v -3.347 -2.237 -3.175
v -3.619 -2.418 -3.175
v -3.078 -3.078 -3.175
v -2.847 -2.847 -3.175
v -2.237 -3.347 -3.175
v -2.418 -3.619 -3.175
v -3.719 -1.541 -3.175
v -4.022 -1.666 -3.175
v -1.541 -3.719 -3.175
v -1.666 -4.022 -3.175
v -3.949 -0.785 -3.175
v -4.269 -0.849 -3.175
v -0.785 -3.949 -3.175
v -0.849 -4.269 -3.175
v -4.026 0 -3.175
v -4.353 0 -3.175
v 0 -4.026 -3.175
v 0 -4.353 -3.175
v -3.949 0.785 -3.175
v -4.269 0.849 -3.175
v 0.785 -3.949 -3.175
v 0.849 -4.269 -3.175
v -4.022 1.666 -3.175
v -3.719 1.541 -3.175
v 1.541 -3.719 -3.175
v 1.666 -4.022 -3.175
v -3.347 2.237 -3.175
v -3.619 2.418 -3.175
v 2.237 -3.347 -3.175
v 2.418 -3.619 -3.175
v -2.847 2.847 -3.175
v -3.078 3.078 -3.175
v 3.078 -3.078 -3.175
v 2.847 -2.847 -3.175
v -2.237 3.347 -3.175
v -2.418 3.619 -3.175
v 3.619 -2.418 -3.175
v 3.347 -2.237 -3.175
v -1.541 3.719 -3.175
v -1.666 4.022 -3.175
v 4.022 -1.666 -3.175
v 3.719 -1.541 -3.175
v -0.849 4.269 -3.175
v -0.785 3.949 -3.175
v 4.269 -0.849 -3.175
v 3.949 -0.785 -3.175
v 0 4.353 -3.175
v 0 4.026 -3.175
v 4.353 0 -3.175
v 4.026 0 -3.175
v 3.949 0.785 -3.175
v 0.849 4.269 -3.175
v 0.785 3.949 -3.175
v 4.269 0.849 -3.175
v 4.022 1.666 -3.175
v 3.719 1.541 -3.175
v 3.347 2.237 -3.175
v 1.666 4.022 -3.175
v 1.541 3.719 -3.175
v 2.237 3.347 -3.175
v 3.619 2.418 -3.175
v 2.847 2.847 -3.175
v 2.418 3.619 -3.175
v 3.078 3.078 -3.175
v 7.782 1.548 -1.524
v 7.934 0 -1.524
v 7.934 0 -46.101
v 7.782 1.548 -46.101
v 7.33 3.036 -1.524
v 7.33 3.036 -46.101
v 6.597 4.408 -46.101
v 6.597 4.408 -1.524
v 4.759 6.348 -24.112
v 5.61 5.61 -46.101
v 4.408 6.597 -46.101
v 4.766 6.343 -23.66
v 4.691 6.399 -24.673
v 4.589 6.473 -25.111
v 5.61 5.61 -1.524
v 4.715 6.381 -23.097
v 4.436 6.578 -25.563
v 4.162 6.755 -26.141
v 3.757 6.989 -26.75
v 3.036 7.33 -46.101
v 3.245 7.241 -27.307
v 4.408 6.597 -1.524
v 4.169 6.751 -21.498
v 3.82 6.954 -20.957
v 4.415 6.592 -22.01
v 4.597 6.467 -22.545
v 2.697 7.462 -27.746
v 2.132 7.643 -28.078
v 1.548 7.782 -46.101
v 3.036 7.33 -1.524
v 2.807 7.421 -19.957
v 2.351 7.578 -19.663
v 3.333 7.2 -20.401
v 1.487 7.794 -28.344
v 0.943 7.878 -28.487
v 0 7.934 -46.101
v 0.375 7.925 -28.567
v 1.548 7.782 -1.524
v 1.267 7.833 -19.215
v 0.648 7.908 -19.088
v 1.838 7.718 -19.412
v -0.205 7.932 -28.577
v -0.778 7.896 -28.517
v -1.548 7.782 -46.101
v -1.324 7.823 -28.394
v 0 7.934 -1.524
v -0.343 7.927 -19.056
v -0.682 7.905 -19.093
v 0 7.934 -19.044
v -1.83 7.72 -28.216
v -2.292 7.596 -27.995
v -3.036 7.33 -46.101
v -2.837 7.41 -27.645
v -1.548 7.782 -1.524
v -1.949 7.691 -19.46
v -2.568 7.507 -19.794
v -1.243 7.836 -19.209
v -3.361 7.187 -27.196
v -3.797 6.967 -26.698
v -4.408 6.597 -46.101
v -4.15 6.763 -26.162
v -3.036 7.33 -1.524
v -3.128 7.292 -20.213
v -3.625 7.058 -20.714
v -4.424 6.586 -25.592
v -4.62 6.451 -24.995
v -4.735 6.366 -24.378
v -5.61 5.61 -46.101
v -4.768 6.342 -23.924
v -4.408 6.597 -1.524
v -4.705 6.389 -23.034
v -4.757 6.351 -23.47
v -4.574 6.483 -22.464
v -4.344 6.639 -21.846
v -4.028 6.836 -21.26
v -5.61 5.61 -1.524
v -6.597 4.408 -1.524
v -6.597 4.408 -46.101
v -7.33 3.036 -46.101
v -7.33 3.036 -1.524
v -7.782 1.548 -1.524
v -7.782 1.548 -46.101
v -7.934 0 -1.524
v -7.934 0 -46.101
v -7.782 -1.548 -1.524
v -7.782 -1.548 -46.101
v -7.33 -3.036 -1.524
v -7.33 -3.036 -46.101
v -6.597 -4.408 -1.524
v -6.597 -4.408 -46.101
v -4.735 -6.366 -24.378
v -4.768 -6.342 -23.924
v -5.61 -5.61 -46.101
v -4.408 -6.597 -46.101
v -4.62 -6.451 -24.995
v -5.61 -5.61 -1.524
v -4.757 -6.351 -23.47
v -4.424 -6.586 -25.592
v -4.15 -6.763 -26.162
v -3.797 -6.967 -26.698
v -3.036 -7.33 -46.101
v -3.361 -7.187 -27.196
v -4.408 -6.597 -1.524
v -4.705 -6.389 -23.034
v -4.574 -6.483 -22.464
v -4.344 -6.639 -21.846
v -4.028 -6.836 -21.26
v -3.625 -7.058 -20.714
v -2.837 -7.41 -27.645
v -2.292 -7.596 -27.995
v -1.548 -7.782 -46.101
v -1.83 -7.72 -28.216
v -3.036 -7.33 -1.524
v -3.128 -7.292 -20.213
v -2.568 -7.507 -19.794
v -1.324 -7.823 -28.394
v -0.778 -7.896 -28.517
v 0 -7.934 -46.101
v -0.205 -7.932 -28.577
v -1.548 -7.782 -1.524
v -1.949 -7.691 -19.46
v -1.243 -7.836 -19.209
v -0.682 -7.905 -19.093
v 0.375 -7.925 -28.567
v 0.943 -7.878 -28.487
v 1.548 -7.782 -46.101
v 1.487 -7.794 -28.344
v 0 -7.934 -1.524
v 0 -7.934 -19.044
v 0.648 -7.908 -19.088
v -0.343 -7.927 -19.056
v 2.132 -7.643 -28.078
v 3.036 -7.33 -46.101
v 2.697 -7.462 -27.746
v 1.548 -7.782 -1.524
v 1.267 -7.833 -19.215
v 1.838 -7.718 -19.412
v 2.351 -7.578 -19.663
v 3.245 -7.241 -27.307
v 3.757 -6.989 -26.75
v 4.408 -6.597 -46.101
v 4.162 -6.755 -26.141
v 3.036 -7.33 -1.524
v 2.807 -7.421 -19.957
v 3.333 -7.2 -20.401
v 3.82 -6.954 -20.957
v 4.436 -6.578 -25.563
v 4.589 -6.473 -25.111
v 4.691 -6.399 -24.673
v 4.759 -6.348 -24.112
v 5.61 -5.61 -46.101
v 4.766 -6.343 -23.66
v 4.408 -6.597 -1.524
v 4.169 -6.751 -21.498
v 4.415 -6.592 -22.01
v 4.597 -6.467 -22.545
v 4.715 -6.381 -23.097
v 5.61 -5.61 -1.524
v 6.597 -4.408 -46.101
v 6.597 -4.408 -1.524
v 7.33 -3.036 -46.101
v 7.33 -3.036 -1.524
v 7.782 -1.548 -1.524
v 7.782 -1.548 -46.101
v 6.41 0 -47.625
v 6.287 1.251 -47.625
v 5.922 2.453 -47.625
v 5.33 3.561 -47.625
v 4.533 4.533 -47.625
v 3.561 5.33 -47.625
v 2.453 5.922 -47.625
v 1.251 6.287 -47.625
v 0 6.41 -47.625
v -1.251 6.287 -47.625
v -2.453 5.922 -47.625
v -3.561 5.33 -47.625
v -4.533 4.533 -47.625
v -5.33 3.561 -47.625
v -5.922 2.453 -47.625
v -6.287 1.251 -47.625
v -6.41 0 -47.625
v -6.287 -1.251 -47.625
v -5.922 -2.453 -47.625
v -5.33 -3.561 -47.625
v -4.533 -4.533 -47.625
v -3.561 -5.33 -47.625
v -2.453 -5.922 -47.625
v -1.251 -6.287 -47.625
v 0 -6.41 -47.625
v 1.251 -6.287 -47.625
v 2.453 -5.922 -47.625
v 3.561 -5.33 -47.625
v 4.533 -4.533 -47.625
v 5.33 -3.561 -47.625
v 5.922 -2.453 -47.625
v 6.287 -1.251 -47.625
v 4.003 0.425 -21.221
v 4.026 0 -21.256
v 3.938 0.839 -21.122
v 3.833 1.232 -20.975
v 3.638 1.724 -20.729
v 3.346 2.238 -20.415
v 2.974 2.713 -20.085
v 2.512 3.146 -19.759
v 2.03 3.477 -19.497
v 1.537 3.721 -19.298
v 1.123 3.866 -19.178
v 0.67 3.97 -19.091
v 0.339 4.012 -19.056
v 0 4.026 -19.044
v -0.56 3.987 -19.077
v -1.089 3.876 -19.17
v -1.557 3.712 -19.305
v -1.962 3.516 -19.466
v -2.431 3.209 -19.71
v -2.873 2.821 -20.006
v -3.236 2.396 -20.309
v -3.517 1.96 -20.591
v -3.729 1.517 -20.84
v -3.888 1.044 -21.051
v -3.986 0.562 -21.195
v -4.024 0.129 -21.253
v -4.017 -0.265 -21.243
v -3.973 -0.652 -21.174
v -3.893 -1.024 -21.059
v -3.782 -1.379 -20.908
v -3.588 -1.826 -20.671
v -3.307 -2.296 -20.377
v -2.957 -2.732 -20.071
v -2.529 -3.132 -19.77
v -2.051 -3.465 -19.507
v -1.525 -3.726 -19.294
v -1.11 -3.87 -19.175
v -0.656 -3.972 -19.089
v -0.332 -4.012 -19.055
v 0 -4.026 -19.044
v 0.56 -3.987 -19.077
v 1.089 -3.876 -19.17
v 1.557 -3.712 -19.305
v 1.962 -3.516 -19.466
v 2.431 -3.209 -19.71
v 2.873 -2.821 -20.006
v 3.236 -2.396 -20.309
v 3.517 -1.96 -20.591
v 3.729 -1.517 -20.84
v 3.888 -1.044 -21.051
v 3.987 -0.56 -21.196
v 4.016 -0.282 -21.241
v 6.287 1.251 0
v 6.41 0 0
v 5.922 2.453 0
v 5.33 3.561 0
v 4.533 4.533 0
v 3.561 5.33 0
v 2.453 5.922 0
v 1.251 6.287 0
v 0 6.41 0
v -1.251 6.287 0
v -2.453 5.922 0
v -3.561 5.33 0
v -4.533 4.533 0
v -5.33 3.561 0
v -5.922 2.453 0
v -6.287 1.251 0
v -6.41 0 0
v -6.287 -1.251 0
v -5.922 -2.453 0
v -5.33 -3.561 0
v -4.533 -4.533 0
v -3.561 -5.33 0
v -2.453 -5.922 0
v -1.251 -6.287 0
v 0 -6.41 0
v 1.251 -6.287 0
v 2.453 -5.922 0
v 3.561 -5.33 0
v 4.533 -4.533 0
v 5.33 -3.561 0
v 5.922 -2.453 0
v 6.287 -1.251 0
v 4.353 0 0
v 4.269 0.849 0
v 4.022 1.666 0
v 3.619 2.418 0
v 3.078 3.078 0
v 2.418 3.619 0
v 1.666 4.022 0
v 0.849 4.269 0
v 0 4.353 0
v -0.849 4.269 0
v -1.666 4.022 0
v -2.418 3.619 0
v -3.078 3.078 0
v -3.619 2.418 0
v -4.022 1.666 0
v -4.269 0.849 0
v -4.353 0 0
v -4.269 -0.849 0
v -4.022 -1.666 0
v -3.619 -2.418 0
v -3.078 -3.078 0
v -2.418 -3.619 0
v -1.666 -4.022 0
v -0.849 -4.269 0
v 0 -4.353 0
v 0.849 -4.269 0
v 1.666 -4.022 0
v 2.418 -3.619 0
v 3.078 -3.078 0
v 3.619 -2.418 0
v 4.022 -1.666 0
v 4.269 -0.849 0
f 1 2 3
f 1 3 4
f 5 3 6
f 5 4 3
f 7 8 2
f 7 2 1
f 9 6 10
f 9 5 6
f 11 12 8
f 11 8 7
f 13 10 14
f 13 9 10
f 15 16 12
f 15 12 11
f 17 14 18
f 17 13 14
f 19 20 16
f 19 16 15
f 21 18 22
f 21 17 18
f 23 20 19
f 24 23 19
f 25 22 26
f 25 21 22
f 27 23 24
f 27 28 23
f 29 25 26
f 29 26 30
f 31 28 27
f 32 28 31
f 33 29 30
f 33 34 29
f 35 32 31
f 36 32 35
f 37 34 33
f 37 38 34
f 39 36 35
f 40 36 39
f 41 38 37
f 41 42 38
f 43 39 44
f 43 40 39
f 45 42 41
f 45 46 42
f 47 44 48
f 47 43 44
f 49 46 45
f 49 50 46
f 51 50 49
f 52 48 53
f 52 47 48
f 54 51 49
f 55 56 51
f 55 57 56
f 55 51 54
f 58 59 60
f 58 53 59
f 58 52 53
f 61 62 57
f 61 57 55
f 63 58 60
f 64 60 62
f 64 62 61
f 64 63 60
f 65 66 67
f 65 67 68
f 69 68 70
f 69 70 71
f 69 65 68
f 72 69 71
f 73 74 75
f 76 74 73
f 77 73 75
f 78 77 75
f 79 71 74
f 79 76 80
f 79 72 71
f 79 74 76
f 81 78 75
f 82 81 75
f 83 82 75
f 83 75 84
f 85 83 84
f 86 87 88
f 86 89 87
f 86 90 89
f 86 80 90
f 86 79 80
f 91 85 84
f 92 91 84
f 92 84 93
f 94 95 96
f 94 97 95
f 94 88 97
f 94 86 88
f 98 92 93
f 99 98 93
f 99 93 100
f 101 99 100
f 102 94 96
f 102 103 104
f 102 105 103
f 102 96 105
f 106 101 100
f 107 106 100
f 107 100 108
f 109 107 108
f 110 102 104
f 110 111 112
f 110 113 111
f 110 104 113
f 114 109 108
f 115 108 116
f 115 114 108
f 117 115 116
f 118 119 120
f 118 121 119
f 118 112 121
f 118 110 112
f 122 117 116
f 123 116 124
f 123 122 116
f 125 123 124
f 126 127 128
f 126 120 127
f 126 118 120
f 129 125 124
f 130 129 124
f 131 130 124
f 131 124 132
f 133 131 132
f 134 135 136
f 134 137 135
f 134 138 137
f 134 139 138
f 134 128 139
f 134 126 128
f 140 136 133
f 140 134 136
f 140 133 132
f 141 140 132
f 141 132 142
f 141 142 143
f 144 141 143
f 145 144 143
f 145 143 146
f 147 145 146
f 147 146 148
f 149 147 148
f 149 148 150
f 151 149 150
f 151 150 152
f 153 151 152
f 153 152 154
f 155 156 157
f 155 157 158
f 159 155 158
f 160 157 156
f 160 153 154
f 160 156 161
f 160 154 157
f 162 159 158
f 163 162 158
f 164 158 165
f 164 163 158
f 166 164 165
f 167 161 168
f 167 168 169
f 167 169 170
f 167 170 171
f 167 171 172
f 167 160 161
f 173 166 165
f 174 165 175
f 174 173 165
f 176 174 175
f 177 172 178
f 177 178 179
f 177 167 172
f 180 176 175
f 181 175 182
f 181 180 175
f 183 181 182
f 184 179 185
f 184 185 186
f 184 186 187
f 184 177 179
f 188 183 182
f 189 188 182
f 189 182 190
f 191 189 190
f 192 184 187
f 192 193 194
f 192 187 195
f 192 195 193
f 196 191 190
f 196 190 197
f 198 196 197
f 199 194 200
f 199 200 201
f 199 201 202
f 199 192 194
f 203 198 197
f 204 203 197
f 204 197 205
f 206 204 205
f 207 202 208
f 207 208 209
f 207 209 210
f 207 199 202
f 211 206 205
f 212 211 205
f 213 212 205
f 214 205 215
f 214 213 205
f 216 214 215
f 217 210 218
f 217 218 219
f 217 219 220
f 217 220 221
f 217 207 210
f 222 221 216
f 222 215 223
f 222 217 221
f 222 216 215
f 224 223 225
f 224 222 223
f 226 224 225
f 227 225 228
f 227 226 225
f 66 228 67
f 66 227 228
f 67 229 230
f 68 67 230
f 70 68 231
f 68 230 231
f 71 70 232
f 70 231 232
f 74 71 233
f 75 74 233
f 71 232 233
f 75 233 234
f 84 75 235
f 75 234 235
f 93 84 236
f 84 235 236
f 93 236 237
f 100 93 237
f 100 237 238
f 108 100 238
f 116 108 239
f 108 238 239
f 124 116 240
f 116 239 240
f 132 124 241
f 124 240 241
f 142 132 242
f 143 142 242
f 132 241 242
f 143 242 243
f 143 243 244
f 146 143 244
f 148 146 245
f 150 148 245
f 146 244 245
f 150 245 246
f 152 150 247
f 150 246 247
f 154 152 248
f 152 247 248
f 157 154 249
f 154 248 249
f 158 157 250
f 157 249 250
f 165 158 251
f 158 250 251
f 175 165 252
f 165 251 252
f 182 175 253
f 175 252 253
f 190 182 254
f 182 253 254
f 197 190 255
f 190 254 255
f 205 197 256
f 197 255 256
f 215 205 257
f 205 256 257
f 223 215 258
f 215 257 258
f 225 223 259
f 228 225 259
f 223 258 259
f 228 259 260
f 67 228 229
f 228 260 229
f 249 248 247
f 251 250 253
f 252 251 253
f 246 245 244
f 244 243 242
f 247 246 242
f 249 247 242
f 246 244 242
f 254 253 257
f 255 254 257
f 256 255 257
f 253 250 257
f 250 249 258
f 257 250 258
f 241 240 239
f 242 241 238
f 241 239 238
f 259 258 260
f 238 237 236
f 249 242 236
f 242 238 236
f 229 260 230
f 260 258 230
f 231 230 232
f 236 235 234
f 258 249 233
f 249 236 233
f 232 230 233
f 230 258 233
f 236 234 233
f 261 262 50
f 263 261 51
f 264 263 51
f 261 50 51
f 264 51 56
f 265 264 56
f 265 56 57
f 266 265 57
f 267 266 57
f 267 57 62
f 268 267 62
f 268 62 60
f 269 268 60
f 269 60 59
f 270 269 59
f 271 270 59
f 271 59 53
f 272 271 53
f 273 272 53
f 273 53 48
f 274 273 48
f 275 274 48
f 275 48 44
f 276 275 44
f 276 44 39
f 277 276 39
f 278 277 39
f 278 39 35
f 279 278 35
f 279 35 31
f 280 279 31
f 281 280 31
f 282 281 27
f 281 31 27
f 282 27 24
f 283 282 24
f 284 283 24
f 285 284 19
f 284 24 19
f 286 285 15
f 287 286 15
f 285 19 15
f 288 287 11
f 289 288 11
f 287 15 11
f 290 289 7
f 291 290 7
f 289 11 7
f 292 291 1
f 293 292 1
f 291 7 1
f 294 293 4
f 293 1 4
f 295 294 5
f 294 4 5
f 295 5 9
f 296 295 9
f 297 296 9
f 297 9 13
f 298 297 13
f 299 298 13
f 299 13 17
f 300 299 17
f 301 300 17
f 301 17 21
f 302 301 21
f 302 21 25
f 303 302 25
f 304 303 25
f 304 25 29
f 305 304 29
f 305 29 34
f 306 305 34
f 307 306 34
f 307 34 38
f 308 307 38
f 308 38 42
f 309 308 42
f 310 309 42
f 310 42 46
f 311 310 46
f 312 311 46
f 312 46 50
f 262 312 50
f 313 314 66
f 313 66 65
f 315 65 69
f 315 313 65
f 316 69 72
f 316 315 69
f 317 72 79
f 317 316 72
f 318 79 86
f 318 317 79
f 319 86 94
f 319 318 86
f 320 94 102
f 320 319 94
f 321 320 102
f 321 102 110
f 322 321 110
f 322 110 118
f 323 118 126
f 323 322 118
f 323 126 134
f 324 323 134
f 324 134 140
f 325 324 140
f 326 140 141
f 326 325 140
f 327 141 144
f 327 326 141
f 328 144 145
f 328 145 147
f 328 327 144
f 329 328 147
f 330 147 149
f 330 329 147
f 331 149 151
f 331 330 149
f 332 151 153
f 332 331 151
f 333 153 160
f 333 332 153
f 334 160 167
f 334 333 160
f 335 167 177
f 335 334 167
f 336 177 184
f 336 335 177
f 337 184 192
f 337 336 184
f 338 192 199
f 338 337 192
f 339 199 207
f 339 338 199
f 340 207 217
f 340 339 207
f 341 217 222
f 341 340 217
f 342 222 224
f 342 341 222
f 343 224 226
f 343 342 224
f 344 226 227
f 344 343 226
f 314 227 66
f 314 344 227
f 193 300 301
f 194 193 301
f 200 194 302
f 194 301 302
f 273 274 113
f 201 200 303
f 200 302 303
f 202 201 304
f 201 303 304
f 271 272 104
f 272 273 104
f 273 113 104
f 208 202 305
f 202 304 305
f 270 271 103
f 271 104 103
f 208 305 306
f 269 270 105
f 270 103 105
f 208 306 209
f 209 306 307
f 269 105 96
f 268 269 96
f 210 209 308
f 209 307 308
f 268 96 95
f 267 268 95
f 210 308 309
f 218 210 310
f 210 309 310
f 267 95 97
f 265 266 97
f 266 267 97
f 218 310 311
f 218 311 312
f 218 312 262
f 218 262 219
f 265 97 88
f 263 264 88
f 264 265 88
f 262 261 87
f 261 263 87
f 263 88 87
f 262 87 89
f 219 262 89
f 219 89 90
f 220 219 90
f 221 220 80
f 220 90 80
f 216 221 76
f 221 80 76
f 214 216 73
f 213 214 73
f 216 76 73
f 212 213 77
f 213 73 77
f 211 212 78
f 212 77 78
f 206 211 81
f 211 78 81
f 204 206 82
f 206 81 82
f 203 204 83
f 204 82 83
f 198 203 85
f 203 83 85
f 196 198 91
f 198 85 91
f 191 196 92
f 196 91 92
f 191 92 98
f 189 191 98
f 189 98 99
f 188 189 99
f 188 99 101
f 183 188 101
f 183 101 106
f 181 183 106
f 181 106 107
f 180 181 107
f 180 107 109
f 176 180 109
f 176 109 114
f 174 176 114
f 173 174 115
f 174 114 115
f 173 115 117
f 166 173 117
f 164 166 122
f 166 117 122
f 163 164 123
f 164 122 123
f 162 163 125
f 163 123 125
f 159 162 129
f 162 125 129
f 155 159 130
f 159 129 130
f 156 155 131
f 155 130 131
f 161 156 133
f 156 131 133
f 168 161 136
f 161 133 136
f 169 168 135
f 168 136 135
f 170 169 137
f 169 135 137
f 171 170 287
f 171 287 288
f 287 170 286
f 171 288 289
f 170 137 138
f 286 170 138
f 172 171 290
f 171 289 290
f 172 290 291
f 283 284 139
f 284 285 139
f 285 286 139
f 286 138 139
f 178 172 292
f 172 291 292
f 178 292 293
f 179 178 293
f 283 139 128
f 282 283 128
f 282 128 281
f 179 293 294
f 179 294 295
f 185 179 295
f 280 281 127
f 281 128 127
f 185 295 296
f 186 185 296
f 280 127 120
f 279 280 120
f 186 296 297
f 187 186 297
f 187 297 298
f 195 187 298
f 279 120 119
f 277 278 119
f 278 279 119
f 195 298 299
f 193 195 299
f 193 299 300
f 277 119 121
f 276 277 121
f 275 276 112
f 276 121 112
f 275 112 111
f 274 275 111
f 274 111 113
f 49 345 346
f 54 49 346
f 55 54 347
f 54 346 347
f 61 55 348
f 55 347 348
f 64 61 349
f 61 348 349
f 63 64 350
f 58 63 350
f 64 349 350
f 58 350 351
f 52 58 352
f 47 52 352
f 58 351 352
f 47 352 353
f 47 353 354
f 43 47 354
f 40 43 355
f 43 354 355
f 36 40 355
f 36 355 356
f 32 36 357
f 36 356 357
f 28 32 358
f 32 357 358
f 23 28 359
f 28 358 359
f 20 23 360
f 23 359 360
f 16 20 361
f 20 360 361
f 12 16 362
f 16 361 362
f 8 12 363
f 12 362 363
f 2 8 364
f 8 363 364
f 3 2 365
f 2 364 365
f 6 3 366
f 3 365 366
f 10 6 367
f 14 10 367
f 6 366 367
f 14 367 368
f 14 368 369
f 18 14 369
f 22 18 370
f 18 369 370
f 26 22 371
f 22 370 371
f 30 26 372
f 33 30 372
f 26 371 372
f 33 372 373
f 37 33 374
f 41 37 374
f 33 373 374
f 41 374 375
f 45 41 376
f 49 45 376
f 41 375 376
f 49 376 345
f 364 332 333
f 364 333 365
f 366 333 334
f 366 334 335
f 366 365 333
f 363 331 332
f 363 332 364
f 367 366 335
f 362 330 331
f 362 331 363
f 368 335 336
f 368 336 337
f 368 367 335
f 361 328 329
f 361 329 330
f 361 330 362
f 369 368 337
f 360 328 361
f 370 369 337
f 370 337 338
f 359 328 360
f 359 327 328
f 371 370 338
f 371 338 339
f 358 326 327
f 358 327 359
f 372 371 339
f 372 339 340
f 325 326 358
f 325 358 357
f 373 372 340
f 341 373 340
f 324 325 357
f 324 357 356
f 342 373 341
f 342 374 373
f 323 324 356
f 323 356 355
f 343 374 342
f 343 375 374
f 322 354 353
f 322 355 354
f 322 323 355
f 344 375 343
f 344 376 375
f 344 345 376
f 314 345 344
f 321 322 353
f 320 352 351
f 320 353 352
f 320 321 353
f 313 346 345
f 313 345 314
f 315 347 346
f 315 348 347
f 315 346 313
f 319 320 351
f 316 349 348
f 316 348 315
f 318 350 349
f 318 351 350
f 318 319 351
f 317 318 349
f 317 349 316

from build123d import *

# Parameters (mm, degrees)
SKETCH1_R           = 7.934325
BOSS_EXTRUDE1_DEPTH = 47.625
SKETCH3_R           = 4.76885
CUT_EXTRUDE1_DEPTH  = 14.2875
SKETCH2_R           = 4.0259
CUT_EXTRUDE2_DEPTH  = 25.4
SKETCH5_R           = 4.352925
CUT_EXTRUDE3_DEPTH  = 3.175
CHAMFER1_SIZE       = 1.524


with BuildPart() as part:
    # Sketch1 → Boss-Extrude1 (new body)
    with BuildSketch(Plane.XY):
        Circle(SKETCH1_R)
    extrude(amount=-BOSS_EXTRUDE1_DEPTH)

    # Sketch3 → Cut-Extrude1 (cut, symmetric)
    with BuildSketch(Plane(origin=(0, 0, 0), x_dir=(1, 0, 0), z_dir=(0, 1, 0))):
        with Locations(Location((0, 23.8125, 0), (0, 0, 270))):
            Circle(SKETCH3_R)
    extrude(amount=CUT_EXTRUDE1_DEPTH, both=True, mode=Mode.SUBTRACT)

    # Sketch2 → Cut-Extrude2 (cut)
    with BuildSketch(Plane.XY):
        Circle(SKETCH2_R)
    extrude(amount=-CUT_EXTRUDE2_DEPTH, mode=Mode.SUBTRACT)

    # Sketch5 → Cut-Extrude3 (cut)
    with BuildSketch(Plane.XY):
        Circle(SKETCH5_R)
    extrude(amount=-CUT_EXTRUDE3_DEPTH, mode=Mode.SUBTRACT)

    # Chamfer1
    chamfer1_edges = [part.edges().sort_by_distance(p)[0] for p in [
        (-7.934325, 0, 0),
        (-7.934325, 0, -47.625),
    ]]
    chamfer(chamfer1_edges, length=CHAMFER1_SIZE)


solid = part.part
